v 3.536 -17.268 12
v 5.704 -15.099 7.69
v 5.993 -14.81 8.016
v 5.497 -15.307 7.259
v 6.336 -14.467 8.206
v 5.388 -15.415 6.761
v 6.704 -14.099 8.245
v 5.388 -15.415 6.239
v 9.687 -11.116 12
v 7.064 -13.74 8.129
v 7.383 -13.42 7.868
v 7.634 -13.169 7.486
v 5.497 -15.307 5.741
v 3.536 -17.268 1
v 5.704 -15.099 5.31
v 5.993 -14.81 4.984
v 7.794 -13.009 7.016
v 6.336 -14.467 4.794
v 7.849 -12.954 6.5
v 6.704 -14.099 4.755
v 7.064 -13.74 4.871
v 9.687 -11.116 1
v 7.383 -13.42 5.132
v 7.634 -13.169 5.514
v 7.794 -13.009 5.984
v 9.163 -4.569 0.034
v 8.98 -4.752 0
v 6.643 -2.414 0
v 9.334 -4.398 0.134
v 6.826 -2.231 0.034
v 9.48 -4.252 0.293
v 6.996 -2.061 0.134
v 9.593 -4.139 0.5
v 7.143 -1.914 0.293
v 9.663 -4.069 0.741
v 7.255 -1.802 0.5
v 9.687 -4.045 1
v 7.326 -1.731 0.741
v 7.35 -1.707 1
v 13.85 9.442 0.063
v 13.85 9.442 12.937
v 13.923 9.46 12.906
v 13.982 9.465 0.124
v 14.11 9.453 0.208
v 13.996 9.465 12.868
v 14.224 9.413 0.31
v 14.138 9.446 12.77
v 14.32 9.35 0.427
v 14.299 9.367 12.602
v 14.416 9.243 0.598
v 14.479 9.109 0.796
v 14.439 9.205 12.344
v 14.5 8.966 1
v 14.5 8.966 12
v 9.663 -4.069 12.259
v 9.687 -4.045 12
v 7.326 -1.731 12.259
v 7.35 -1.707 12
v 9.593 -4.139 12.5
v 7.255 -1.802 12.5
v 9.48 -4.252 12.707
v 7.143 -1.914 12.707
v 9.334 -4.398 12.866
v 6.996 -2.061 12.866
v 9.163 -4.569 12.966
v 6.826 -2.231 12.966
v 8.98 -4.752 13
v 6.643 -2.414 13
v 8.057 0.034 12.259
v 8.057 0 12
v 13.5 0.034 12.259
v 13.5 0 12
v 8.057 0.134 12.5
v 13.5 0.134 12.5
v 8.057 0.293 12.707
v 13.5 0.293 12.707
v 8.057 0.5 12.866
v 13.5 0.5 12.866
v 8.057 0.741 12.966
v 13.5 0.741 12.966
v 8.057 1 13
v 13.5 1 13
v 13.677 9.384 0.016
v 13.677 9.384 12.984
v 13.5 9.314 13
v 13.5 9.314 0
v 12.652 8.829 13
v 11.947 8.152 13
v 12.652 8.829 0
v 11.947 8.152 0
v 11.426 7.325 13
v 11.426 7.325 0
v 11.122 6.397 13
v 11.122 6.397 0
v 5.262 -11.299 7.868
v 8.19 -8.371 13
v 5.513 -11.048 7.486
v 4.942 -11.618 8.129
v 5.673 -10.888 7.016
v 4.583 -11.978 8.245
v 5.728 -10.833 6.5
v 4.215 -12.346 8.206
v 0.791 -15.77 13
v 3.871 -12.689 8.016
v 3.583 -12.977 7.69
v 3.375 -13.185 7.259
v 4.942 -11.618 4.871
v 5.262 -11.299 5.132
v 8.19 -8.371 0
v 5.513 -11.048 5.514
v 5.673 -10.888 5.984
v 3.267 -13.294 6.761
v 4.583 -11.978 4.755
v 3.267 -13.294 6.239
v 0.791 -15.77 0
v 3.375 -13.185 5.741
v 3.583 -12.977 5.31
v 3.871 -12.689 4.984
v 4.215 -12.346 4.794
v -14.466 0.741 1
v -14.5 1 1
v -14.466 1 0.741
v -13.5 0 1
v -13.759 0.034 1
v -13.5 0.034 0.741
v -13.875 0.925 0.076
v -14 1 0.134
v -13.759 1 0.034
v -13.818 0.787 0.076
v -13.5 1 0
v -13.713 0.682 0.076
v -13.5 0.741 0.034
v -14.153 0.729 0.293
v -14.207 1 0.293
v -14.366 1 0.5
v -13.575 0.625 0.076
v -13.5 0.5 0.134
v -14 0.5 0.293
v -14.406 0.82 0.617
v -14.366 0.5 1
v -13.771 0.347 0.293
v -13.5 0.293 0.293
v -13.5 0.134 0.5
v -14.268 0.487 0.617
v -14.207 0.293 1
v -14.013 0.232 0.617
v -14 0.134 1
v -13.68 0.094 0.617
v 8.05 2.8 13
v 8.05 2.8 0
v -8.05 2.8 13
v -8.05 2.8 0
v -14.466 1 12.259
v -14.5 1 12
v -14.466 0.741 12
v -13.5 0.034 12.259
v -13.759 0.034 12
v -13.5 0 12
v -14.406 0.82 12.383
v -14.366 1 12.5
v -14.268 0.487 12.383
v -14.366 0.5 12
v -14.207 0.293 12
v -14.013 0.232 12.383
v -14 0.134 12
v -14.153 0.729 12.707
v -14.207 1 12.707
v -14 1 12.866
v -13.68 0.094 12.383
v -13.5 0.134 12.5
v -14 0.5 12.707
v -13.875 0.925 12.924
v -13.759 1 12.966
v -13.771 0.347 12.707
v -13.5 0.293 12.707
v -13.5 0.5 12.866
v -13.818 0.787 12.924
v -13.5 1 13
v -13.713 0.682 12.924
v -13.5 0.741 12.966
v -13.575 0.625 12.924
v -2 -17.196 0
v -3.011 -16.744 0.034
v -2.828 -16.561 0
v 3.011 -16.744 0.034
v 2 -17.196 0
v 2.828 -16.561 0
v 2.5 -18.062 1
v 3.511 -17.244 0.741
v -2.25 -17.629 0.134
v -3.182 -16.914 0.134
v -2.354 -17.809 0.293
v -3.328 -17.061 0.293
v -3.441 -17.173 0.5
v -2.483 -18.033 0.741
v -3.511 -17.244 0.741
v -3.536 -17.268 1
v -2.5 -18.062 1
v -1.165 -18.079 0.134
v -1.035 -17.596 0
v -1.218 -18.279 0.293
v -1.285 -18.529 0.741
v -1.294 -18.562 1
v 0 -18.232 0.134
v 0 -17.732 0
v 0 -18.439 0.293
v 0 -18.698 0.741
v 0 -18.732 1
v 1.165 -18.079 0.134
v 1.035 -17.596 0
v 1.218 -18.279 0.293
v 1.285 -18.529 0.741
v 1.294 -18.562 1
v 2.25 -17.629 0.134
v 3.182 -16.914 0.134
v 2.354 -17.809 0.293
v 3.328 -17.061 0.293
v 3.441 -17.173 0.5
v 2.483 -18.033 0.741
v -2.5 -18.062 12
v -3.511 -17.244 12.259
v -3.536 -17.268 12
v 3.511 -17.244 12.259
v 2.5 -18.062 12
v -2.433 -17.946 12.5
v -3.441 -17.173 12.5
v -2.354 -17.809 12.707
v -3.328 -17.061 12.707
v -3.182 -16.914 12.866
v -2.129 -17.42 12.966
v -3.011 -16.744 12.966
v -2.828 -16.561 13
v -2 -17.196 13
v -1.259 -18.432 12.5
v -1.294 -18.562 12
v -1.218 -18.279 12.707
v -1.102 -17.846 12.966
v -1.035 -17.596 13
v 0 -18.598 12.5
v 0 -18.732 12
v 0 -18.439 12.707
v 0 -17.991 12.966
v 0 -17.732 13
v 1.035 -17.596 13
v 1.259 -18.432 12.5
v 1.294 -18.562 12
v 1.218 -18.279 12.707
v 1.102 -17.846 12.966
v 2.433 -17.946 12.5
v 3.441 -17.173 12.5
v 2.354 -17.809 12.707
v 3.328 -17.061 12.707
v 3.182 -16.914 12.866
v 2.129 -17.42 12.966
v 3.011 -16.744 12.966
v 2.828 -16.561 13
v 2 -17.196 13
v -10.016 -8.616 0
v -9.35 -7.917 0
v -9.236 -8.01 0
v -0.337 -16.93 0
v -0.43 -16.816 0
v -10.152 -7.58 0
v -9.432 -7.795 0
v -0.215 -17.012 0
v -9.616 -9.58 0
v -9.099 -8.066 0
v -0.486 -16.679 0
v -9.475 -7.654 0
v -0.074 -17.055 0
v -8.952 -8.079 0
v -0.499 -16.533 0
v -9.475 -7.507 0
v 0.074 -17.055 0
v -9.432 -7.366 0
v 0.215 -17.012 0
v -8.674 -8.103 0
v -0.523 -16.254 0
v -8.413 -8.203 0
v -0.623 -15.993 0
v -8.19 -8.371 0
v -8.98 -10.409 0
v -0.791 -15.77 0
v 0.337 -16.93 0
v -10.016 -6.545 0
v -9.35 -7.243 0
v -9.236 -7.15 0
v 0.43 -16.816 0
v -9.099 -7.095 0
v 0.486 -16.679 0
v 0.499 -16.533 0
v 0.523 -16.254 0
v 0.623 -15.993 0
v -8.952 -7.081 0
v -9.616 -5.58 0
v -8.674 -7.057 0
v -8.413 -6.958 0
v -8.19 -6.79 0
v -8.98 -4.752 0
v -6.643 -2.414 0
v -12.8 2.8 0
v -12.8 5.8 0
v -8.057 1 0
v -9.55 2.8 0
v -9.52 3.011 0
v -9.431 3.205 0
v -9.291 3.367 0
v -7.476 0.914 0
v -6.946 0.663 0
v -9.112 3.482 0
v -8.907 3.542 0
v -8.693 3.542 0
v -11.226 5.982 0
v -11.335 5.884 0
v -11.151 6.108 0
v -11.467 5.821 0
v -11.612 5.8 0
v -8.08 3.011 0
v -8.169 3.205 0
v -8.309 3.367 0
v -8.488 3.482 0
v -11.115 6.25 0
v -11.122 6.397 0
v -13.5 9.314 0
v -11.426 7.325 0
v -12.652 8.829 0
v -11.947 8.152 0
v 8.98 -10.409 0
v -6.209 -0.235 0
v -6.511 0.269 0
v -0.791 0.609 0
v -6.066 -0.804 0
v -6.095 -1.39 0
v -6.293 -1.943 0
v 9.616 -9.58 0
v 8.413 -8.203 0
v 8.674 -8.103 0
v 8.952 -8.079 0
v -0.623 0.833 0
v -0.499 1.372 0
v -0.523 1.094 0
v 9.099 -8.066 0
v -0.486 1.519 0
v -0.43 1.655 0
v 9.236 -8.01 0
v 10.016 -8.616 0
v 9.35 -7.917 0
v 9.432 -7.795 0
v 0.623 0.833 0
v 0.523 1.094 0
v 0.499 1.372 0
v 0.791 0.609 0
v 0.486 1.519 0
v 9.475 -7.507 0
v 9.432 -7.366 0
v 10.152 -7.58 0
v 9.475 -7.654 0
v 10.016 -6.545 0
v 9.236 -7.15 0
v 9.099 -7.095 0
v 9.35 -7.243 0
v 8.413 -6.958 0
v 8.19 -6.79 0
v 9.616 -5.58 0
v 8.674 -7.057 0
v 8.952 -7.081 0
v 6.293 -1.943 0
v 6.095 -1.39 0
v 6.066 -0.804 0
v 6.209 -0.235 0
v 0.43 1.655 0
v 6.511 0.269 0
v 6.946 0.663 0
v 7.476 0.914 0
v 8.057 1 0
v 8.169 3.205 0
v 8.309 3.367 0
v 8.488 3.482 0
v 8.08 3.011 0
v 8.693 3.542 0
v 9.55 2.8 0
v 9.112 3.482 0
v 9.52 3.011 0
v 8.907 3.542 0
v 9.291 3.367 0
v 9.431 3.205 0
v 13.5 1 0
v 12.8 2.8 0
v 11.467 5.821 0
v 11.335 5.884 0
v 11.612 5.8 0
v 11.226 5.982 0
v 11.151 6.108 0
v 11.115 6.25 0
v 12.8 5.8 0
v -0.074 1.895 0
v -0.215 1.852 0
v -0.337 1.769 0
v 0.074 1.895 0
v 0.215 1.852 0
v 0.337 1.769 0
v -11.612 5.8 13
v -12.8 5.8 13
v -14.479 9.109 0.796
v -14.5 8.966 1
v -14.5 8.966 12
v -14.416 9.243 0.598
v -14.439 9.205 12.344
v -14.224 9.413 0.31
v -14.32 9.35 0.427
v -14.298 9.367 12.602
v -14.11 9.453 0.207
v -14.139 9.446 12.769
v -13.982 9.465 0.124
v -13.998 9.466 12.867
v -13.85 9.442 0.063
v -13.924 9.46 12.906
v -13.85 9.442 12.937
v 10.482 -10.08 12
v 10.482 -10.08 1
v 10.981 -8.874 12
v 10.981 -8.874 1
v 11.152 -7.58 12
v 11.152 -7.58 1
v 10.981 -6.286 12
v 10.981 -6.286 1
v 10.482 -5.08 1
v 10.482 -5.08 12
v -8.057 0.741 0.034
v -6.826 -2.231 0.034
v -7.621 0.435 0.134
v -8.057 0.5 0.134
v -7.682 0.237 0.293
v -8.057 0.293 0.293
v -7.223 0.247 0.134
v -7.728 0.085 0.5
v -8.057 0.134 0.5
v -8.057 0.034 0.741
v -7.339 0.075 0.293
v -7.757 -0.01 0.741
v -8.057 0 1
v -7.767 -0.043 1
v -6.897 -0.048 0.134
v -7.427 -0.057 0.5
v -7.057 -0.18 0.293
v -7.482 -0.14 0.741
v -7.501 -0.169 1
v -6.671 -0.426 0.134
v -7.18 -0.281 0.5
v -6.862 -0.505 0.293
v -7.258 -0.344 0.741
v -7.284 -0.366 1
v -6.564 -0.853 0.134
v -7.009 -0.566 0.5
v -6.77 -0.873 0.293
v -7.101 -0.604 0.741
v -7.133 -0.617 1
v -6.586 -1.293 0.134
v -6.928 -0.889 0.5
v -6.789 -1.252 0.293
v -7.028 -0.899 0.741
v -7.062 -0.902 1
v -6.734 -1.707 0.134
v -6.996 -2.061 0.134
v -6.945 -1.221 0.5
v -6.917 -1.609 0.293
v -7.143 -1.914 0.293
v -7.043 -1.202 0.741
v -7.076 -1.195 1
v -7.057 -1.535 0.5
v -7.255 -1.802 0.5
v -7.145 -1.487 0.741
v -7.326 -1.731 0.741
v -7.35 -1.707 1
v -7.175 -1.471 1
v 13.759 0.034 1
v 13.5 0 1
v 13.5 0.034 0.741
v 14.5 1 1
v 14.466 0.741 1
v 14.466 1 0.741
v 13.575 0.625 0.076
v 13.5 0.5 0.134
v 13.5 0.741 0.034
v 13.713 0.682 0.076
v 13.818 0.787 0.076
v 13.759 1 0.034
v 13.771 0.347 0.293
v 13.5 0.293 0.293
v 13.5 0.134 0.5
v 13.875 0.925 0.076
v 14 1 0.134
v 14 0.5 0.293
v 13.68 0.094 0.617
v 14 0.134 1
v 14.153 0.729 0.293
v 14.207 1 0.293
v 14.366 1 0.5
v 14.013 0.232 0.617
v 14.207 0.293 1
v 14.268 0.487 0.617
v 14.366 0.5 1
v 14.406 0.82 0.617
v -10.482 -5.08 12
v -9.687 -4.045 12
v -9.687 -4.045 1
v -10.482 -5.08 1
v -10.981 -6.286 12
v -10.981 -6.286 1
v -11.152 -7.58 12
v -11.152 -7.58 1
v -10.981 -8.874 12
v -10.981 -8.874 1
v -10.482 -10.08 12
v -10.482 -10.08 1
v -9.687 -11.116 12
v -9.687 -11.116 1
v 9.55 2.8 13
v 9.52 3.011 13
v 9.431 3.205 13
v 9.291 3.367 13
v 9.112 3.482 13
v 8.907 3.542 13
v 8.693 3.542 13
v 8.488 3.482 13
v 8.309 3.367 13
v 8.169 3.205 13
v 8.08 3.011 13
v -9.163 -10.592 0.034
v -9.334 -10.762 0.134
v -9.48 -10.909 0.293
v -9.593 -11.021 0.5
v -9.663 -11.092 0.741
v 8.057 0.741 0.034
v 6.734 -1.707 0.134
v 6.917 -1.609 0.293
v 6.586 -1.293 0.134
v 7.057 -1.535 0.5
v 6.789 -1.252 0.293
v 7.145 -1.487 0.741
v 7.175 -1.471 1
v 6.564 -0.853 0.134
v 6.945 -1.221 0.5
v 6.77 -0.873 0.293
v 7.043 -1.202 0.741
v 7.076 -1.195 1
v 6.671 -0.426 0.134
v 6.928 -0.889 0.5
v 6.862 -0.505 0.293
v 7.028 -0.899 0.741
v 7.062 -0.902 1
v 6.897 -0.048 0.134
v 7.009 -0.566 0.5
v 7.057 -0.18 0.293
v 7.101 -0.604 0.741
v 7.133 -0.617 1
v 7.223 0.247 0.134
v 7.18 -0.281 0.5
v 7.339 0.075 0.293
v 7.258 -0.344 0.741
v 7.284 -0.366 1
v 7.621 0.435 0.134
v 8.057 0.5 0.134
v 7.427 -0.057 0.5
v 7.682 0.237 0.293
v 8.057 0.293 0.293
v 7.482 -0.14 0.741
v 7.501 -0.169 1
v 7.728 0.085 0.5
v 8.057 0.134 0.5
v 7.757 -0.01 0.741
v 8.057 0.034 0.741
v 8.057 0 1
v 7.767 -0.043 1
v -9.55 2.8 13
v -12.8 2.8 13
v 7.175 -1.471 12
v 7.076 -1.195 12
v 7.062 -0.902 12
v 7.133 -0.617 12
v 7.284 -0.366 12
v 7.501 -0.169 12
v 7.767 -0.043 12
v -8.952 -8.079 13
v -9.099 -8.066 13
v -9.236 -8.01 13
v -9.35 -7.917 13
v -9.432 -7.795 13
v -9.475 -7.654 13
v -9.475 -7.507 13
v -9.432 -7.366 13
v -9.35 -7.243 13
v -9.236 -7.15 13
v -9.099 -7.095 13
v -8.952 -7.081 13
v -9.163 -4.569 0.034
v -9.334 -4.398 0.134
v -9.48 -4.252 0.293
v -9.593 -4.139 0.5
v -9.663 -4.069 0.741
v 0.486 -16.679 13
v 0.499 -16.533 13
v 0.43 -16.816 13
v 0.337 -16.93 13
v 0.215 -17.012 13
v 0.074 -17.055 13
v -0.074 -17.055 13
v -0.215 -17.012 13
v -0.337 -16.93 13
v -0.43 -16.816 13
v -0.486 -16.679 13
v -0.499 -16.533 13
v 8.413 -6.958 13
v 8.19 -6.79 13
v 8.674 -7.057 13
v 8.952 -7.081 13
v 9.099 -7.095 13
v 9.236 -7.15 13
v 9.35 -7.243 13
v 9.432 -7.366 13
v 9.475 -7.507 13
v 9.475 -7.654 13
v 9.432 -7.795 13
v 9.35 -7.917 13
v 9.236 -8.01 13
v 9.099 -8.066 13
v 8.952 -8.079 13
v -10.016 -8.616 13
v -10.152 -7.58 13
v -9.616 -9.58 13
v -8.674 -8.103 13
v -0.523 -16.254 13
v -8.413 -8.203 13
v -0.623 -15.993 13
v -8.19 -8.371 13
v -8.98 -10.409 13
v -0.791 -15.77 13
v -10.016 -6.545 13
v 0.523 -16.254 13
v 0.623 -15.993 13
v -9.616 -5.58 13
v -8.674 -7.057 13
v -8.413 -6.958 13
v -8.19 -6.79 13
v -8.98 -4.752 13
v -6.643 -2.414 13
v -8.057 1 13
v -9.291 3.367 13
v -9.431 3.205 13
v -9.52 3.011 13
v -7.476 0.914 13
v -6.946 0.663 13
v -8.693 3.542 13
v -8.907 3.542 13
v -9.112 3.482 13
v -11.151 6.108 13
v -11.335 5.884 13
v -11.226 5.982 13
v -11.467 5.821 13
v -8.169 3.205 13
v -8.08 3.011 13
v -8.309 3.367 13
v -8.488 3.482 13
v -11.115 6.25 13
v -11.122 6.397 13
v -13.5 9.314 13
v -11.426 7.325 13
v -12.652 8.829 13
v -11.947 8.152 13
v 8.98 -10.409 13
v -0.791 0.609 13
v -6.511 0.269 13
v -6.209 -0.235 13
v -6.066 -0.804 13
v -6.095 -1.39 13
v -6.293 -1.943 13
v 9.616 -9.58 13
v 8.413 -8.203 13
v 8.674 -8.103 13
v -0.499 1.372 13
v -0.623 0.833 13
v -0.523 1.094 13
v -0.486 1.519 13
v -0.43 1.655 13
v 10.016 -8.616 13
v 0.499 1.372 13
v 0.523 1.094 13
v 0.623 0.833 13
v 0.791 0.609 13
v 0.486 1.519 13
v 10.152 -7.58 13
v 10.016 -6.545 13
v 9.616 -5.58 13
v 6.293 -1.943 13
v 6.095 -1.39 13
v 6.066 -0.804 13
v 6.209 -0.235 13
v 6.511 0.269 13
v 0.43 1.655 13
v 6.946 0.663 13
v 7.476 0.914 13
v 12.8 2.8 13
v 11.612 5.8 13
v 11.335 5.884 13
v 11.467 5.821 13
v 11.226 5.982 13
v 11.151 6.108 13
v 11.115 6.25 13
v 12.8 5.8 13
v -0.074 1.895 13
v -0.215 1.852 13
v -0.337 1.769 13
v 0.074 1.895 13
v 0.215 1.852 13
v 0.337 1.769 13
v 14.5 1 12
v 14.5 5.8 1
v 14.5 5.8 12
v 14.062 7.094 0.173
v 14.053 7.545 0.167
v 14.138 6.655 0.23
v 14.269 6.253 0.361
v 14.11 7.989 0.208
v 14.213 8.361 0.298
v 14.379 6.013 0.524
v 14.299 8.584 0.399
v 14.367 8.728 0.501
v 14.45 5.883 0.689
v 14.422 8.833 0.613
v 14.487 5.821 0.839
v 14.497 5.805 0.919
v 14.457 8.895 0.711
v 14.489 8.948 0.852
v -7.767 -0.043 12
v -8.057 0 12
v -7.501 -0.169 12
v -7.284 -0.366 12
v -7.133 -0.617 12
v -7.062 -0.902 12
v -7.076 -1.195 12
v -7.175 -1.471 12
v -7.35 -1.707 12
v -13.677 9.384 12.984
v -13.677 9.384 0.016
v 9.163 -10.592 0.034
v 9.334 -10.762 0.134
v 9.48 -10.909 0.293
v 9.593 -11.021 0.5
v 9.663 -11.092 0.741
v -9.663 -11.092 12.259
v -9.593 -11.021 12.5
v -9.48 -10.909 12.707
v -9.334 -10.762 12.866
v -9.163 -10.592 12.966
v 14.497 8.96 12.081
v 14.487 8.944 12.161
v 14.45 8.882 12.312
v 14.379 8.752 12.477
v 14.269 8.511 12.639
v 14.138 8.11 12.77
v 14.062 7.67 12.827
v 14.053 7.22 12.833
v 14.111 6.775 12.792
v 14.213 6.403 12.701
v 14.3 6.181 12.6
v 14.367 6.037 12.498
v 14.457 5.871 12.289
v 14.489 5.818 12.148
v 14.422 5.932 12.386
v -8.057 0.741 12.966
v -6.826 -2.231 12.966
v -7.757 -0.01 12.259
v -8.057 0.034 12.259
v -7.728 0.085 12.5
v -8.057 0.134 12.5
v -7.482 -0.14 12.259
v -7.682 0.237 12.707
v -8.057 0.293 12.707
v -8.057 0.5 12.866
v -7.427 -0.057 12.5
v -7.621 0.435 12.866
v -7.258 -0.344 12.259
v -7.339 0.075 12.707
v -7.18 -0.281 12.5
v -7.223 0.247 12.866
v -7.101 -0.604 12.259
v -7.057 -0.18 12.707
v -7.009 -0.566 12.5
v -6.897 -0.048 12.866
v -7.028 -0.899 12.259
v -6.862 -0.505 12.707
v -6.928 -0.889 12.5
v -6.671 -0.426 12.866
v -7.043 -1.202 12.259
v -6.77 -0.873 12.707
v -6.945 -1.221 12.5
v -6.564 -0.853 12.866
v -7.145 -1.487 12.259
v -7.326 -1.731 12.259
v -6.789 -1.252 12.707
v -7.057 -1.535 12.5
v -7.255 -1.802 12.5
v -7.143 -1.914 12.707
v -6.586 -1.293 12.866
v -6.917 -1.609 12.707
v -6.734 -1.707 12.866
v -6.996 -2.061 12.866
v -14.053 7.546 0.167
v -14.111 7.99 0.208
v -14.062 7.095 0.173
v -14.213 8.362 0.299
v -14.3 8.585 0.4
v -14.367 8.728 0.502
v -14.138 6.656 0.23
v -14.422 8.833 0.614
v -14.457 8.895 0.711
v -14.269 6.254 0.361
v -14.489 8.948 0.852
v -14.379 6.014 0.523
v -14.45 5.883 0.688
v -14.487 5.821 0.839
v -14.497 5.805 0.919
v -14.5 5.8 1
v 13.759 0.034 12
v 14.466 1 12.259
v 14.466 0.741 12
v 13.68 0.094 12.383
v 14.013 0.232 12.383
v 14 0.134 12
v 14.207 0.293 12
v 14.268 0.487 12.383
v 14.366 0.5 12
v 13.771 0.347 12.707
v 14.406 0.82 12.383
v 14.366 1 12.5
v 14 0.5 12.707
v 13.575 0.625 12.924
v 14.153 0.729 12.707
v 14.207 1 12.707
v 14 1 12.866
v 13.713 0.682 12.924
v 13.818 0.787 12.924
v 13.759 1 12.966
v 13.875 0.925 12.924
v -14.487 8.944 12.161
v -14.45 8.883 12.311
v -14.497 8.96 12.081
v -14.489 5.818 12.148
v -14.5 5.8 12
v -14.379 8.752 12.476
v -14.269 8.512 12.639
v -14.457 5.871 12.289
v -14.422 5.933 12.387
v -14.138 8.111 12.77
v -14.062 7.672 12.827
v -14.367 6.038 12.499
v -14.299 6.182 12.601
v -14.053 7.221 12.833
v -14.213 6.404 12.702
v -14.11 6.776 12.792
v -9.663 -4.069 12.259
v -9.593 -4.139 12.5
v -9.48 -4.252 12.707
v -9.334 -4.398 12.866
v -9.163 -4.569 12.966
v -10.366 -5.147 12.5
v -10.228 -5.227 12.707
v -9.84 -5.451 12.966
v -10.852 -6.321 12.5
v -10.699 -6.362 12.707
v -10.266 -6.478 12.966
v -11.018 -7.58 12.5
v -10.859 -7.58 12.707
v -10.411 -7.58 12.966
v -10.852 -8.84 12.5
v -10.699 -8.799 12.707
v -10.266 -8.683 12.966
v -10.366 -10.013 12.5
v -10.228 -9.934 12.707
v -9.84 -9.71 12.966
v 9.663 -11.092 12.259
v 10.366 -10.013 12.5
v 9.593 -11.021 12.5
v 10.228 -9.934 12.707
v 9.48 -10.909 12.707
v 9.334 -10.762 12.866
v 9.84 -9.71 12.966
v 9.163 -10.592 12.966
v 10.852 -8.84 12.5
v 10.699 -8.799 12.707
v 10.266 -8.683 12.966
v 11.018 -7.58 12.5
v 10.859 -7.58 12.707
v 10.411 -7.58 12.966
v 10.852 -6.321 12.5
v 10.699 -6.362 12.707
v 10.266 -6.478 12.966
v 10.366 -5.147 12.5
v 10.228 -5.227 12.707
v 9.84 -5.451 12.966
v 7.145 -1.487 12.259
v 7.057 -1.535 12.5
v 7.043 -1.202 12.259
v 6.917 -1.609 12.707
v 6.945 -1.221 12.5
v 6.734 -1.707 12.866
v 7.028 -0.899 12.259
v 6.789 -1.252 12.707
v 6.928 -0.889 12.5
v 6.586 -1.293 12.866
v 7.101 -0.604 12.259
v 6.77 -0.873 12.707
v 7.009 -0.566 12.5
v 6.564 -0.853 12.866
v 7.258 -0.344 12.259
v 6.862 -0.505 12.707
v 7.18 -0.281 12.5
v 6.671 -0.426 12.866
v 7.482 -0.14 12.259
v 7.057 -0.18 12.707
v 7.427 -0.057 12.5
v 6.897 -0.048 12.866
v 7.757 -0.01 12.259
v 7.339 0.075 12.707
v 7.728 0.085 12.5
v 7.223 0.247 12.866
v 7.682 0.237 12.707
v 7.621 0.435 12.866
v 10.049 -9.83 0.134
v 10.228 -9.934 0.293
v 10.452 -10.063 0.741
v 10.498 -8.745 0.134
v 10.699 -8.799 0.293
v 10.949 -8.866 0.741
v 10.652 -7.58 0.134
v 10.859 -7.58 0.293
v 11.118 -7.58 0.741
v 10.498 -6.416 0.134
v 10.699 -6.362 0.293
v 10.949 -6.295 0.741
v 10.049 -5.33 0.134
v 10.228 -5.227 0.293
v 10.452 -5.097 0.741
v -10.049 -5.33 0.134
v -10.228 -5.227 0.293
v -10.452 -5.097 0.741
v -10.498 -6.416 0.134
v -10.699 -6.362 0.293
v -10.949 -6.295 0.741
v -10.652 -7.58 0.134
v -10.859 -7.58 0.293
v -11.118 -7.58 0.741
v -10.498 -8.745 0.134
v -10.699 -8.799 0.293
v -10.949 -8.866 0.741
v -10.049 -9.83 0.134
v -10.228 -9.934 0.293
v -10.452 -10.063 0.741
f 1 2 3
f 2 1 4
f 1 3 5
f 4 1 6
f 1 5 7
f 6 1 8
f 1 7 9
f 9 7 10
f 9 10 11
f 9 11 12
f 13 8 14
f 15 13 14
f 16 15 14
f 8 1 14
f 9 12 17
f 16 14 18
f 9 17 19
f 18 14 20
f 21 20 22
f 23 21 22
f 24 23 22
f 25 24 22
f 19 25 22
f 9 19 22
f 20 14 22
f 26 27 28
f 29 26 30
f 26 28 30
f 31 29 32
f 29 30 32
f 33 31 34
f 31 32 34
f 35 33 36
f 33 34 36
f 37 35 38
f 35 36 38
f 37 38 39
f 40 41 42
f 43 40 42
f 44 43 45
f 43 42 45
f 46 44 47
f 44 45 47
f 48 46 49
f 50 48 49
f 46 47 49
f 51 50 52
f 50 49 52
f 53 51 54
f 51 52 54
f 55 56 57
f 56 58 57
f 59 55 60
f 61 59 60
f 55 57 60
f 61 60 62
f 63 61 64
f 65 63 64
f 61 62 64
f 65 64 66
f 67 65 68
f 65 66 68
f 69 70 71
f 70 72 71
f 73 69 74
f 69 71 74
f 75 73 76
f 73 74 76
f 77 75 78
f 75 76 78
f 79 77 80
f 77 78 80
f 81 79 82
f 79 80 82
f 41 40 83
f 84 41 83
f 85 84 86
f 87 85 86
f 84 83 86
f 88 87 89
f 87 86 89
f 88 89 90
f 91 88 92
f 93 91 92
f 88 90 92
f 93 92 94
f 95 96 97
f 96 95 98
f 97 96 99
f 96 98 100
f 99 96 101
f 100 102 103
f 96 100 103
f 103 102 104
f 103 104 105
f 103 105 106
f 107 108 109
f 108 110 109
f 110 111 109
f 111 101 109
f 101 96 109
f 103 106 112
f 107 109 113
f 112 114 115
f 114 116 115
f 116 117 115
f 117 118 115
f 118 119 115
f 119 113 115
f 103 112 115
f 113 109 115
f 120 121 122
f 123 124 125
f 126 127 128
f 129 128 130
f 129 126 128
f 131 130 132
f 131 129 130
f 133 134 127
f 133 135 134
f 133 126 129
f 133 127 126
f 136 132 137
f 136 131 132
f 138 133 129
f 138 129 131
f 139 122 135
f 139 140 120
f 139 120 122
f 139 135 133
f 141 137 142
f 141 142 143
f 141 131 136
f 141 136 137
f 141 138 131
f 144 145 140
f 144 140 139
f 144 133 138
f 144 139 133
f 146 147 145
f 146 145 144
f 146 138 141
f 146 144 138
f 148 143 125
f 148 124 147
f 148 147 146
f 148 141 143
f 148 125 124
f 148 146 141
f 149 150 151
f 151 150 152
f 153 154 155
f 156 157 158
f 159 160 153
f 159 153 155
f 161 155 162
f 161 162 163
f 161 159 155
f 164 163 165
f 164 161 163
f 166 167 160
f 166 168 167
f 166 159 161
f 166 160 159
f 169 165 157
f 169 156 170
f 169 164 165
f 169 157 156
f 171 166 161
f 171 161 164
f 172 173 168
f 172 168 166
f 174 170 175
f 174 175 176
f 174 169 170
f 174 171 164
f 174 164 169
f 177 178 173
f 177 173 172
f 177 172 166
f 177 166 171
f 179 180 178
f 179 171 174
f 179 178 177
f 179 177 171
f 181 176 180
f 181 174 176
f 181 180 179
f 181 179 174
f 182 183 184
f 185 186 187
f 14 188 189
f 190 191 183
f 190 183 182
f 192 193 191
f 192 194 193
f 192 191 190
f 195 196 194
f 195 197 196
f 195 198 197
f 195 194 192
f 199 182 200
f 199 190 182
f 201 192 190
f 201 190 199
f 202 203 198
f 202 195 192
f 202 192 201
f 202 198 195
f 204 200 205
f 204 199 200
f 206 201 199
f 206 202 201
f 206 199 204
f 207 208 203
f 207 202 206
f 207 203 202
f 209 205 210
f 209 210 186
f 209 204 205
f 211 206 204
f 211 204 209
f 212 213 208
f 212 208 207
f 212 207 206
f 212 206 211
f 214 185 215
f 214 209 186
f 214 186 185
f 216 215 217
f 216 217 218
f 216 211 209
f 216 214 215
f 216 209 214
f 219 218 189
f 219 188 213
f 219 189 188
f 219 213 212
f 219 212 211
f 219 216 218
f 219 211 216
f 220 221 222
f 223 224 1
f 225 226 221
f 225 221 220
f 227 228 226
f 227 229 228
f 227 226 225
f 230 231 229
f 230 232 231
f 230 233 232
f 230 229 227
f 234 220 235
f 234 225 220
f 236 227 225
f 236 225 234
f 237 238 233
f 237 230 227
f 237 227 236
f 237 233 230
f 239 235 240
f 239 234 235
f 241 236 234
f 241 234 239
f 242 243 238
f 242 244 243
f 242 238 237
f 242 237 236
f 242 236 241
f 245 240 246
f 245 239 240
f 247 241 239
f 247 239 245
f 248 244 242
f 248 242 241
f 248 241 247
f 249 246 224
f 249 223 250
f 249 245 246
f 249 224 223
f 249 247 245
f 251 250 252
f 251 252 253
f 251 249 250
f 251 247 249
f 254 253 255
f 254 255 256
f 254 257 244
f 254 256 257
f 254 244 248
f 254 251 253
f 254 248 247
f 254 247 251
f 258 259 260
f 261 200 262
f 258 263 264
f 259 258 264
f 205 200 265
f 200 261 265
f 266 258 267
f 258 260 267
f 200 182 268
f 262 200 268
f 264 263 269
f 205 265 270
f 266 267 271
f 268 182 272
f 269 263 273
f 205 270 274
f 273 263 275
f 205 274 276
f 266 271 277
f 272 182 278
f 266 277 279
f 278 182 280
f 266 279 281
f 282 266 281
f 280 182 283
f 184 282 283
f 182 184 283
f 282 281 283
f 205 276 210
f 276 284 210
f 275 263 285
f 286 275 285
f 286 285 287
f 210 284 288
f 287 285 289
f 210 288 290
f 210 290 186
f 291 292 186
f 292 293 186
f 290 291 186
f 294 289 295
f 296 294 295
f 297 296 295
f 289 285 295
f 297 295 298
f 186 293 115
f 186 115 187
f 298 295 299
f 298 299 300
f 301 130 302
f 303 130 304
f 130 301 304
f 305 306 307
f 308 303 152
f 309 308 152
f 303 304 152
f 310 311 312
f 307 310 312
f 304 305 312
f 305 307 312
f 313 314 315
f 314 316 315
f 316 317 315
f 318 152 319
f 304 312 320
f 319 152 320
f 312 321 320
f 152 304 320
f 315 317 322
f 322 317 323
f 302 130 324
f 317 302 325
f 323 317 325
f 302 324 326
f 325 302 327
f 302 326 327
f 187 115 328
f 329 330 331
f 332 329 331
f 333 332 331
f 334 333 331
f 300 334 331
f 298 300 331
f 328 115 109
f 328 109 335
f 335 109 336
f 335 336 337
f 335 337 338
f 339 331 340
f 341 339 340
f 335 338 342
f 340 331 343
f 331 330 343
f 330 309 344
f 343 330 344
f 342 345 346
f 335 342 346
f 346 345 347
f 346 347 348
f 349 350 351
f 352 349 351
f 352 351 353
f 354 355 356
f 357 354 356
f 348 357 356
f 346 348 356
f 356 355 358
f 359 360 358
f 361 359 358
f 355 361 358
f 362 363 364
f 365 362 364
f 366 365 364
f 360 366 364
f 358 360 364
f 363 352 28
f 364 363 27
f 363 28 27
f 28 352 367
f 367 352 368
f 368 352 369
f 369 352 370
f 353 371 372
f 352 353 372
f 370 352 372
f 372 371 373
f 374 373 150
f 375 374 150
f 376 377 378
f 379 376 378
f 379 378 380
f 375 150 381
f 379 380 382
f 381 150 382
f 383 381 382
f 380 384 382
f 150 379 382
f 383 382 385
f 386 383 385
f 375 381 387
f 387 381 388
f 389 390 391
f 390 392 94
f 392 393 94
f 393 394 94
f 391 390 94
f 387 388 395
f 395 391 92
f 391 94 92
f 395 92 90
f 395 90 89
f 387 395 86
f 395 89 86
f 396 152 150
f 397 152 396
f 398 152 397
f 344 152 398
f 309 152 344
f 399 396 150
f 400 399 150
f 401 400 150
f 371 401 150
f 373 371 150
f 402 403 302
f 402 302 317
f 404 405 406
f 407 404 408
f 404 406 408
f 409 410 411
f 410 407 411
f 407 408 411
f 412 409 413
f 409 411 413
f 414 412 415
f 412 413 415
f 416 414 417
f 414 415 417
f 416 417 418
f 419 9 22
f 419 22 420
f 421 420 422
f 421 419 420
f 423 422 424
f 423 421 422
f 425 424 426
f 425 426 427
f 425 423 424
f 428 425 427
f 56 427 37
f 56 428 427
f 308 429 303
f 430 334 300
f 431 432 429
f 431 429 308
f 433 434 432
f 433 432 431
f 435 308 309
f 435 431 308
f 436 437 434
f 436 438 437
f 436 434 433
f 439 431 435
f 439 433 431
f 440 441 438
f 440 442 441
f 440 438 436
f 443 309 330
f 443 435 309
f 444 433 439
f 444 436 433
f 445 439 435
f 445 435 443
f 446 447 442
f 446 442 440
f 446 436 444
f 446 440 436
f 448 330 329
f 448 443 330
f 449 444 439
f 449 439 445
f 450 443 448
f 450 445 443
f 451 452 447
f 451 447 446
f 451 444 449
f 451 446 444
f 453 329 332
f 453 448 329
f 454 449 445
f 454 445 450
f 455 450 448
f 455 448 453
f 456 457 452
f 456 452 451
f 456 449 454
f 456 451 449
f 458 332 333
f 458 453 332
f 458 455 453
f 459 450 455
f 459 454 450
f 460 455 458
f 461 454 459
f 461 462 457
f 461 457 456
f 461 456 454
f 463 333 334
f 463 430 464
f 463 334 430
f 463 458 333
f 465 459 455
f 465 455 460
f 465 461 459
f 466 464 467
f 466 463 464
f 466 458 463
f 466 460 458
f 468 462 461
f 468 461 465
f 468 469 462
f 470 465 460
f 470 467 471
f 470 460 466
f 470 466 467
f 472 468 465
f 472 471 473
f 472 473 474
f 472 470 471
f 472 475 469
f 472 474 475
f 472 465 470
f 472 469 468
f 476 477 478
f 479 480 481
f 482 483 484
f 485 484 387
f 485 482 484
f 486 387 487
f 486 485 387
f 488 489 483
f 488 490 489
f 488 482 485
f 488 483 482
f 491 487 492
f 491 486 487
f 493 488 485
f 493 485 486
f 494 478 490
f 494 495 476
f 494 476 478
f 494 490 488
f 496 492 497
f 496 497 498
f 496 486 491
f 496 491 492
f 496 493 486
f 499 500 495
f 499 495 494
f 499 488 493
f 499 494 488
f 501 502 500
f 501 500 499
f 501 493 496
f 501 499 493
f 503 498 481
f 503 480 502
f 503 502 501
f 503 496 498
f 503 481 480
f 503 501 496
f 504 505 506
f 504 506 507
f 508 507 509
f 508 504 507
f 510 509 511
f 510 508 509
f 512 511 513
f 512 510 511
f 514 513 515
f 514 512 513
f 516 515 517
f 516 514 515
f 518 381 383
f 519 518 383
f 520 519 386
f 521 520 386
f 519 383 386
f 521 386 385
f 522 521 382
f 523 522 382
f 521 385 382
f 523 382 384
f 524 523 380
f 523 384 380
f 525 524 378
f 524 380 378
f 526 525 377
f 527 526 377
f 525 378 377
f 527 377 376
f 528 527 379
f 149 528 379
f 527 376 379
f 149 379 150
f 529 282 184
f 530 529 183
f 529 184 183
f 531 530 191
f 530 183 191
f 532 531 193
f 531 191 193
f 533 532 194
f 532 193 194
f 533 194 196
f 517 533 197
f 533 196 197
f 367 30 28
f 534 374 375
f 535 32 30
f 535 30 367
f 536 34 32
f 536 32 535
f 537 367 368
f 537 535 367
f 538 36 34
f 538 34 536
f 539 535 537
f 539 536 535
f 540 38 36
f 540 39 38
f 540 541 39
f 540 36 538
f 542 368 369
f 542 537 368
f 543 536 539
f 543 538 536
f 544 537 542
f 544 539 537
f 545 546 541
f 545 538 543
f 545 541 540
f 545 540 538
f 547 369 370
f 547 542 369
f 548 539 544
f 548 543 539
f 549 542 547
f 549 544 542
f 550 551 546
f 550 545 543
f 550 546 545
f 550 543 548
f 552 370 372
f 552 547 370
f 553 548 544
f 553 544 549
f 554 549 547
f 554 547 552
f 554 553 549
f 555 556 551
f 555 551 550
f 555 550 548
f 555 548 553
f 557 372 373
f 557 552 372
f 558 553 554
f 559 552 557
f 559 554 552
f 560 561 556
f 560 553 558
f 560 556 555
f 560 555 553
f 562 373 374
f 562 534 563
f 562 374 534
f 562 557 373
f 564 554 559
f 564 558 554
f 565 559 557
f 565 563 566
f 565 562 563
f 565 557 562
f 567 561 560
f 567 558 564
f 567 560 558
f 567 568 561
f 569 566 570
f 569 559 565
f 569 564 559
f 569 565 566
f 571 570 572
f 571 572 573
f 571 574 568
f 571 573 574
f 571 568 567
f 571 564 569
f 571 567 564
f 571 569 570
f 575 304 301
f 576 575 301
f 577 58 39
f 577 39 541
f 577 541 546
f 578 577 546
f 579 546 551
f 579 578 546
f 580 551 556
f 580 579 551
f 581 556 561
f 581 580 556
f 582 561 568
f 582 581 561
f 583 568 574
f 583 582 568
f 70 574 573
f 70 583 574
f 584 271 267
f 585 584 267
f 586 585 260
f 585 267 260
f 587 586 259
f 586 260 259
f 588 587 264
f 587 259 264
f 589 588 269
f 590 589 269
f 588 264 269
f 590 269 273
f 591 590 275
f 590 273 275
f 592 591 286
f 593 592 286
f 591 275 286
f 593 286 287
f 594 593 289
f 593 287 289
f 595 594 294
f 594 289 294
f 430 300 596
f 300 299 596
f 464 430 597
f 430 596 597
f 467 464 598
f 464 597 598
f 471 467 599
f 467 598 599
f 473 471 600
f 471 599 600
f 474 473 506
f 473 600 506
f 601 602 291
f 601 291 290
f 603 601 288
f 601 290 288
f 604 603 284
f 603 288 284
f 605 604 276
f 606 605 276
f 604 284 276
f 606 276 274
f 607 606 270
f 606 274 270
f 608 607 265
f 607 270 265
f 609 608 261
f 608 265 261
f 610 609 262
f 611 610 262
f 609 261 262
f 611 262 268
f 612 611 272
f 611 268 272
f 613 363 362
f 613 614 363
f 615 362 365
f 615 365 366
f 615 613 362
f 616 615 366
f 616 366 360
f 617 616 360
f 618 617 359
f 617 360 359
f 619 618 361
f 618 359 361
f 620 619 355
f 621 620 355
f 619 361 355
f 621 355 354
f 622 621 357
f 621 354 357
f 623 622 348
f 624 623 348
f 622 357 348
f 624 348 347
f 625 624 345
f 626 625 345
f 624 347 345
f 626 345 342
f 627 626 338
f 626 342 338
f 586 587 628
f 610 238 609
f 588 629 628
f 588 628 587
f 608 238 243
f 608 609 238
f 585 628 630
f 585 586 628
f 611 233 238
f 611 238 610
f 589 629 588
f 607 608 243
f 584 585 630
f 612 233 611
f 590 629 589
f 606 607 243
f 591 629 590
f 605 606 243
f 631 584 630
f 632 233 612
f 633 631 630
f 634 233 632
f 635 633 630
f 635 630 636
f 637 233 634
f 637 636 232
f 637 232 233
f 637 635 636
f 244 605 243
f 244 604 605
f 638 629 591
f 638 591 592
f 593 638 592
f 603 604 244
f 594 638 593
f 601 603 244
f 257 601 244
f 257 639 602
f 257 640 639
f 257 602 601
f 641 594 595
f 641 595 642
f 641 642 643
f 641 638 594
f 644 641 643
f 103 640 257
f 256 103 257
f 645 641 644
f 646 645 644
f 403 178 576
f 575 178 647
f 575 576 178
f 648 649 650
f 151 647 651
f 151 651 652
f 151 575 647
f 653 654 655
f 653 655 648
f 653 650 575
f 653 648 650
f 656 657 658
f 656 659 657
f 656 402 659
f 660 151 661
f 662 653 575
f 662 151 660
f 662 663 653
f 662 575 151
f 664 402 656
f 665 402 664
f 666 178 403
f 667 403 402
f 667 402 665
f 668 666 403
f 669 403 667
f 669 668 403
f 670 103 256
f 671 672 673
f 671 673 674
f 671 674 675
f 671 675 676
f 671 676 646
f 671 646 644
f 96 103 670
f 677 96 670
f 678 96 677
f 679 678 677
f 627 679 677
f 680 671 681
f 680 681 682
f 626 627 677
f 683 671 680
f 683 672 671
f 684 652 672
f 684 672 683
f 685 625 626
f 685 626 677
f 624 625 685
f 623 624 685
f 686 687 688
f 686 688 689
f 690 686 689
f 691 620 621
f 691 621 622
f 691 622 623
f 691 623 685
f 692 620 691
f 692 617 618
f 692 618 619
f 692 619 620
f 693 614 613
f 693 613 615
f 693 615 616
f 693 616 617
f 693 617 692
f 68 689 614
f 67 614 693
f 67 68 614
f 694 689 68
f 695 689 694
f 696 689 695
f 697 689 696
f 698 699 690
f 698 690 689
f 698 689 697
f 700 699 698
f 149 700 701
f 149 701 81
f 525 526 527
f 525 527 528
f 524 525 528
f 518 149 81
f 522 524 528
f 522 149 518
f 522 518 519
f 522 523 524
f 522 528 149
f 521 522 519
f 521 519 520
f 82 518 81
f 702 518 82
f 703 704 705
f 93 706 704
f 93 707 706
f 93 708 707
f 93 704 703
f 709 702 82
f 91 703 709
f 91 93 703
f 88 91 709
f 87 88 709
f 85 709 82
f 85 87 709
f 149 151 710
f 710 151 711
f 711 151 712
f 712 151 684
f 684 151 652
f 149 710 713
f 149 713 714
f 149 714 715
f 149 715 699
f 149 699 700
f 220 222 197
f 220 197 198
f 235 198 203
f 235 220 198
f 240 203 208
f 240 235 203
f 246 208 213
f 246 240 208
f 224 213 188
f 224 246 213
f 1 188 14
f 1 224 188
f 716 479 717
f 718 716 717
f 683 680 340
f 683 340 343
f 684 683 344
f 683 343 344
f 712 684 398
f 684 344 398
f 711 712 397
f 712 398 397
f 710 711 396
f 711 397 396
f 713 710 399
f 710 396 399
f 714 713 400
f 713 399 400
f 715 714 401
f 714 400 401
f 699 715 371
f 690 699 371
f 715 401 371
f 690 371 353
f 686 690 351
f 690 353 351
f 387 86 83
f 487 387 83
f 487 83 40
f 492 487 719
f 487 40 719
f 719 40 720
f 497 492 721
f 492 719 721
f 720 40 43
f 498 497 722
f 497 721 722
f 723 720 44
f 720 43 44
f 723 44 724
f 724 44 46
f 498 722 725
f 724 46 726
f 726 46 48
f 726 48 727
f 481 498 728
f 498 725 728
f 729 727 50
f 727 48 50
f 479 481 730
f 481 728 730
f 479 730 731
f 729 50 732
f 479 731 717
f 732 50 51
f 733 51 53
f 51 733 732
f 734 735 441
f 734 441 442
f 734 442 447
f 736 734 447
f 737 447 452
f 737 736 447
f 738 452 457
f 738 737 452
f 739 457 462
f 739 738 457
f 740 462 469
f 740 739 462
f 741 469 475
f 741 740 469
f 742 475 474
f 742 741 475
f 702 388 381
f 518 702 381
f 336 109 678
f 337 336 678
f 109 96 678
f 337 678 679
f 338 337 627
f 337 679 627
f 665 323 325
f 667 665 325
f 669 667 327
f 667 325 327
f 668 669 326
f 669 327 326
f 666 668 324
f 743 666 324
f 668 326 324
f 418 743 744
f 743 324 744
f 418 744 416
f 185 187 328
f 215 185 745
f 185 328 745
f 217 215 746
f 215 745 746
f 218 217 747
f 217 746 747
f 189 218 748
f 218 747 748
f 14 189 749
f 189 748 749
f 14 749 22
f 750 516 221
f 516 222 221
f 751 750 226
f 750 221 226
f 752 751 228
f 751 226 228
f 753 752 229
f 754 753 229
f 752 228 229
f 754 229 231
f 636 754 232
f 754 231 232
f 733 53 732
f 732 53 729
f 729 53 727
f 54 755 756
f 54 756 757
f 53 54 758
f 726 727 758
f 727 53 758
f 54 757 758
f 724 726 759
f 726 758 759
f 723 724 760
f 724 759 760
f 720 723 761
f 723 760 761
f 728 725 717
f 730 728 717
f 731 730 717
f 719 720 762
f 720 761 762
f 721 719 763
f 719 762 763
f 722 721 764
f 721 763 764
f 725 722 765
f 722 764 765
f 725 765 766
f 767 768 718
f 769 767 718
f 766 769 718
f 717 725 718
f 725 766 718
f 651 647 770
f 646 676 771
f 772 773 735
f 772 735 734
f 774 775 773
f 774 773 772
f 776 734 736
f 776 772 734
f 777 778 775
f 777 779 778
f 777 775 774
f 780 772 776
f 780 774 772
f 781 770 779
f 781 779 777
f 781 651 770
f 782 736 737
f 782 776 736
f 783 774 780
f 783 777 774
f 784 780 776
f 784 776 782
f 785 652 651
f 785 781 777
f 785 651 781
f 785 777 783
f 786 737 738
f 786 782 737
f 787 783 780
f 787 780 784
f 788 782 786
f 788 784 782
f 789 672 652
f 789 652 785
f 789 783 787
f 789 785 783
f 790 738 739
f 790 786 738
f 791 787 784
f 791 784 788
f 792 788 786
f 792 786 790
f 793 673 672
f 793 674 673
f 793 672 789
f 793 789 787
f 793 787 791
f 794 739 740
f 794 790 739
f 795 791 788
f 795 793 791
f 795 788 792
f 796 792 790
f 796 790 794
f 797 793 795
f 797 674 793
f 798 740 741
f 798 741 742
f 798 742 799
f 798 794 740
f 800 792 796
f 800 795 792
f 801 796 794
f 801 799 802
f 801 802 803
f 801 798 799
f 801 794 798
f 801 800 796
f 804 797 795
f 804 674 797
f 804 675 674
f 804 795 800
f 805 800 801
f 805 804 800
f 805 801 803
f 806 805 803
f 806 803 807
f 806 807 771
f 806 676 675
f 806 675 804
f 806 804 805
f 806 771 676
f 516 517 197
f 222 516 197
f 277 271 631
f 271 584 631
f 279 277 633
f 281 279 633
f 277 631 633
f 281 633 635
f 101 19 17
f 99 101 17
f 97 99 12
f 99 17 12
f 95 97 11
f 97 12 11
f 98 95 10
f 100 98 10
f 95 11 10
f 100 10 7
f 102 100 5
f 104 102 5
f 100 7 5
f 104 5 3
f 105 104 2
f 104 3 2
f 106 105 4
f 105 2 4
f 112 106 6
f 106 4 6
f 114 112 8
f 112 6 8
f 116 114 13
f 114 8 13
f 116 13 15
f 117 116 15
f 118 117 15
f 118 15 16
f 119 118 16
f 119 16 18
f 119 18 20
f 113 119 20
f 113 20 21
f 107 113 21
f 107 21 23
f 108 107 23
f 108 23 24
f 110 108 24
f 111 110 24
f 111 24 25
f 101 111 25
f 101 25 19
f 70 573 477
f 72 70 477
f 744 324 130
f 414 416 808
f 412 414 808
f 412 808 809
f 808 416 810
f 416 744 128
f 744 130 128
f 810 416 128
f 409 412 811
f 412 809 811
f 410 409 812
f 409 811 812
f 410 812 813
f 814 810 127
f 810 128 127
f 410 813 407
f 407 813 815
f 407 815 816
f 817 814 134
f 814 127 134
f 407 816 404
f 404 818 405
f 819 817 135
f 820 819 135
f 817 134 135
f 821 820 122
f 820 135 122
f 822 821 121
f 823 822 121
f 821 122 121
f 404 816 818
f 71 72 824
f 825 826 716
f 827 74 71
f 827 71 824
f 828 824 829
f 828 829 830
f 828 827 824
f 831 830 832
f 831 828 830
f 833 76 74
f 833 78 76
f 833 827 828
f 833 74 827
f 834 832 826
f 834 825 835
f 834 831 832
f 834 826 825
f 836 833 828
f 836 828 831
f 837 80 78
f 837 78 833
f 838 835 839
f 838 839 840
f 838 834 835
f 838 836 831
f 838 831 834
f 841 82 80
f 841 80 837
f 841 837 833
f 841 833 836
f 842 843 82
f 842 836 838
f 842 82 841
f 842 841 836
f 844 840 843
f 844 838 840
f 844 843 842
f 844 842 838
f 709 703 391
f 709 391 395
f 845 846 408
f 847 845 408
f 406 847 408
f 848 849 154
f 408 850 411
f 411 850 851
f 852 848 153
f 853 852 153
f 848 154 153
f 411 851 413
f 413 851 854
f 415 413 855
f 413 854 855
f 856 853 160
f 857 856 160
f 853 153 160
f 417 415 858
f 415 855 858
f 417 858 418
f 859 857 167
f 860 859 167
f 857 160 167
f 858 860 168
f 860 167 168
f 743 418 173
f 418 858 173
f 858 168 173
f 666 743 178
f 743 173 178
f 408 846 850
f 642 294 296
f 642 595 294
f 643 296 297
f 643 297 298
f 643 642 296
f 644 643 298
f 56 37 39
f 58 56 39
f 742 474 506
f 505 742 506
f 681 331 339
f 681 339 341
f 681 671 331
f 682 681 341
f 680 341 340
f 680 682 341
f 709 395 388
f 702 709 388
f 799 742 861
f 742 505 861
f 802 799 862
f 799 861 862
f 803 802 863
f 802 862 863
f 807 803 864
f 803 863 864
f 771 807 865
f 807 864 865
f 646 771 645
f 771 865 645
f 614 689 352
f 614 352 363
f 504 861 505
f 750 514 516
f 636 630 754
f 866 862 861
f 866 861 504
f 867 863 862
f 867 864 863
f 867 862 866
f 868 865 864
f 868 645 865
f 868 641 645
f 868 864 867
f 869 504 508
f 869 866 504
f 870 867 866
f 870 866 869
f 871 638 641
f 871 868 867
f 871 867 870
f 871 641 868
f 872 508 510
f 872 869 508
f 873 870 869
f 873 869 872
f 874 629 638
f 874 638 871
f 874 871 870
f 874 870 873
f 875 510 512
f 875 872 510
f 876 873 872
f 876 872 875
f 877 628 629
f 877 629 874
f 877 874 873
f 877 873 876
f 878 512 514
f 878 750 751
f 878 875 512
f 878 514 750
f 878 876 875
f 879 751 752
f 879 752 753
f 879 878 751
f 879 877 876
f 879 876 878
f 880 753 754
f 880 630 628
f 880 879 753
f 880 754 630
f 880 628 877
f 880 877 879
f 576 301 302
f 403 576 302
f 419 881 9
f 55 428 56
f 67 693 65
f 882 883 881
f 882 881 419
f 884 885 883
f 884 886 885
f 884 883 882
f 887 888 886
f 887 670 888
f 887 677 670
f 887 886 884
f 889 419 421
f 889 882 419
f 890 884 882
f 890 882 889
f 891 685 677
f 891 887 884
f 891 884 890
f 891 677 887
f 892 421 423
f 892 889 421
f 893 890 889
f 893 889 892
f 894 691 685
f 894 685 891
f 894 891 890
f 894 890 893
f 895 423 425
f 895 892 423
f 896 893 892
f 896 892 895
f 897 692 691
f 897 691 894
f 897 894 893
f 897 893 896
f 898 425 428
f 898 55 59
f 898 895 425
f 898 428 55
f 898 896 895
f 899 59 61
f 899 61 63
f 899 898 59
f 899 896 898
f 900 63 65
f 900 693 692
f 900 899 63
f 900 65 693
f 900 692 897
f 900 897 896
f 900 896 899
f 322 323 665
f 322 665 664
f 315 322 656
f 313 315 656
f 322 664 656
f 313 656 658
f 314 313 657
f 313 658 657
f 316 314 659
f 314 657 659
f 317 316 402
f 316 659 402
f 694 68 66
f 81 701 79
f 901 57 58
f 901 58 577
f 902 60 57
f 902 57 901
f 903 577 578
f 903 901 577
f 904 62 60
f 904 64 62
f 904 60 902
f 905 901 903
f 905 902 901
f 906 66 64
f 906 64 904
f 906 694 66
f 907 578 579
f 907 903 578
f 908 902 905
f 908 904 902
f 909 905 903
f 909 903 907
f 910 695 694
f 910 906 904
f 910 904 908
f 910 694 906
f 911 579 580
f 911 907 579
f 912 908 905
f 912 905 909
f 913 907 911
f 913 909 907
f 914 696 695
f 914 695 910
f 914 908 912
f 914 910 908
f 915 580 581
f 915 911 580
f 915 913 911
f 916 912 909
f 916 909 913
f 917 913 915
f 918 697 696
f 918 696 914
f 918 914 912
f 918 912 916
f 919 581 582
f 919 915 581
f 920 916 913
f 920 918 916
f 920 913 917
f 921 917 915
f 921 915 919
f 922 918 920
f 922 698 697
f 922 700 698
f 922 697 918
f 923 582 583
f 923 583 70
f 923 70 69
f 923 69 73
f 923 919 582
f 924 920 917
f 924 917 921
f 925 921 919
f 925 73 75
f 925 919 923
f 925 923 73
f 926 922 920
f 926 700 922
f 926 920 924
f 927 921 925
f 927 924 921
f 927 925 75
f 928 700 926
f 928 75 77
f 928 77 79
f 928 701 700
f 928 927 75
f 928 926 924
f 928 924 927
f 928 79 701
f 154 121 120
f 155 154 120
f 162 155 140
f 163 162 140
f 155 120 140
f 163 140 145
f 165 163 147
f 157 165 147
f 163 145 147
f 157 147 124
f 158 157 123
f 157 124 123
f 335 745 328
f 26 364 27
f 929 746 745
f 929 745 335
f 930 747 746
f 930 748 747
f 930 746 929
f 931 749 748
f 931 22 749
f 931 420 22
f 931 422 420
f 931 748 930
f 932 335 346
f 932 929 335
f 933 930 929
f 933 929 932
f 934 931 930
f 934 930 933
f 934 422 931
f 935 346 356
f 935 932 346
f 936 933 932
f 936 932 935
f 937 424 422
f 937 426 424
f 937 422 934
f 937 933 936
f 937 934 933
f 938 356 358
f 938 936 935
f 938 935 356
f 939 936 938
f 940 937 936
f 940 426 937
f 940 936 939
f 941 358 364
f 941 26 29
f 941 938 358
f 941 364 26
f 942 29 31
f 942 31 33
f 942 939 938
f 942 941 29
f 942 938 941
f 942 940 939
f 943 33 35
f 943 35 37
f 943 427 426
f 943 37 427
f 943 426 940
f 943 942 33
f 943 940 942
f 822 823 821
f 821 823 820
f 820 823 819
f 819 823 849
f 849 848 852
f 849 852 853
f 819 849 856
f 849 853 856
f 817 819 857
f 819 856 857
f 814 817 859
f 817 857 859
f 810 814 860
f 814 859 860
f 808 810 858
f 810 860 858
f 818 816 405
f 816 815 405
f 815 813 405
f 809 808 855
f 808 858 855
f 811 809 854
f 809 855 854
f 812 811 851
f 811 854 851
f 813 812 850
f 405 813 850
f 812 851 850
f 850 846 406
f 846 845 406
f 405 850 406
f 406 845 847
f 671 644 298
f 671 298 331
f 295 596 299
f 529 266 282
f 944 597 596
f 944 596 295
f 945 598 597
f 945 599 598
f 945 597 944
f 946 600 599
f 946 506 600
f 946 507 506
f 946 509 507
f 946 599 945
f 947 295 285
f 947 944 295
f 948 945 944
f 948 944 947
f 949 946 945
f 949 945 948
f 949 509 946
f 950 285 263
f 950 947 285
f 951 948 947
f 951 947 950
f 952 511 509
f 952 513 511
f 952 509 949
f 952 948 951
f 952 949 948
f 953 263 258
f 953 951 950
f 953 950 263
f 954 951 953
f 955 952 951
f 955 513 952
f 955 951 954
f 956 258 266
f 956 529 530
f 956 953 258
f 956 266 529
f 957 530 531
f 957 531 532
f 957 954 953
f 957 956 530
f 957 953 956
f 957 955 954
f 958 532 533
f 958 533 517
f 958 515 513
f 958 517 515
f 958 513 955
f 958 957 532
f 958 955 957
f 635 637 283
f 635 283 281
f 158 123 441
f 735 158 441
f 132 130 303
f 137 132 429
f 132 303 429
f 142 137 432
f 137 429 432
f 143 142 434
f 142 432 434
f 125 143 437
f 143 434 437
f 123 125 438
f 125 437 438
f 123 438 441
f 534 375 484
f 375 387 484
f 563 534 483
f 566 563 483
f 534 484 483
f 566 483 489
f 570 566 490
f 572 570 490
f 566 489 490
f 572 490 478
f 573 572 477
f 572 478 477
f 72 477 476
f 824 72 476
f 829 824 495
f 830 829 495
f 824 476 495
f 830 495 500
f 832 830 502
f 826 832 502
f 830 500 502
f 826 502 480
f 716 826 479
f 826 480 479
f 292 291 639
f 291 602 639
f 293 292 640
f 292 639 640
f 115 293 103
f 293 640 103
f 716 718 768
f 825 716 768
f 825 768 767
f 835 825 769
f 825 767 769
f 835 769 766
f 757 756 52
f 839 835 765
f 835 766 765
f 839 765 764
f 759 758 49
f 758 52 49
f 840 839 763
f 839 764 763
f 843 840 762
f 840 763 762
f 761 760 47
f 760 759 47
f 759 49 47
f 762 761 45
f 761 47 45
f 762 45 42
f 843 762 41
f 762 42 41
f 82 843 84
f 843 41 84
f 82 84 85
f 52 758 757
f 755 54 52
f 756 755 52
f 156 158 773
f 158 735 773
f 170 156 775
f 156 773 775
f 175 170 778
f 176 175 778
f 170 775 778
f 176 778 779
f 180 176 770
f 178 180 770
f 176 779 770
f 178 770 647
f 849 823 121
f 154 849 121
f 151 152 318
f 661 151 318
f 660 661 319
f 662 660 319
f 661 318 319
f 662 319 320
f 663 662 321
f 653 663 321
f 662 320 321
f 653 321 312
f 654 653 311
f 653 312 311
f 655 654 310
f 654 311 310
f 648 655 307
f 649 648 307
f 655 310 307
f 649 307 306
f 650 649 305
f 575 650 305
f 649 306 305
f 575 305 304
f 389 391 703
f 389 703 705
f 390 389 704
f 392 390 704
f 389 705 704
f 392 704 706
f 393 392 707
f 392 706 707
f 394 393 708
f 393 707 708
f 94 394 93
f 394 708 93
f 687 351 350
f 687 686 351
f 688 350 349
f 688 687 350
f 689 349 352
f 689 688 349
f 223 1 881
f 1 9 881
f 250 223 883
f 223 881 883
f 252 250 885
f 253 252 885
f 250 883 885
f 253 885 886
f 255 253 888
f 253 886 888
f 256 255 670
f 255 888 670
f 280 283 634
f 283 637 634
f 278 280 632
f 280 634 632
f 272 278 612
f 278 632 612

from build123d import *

# Parameters (mm, degrees)
F1_DEPTH  = 13
F4_DEPTH  = 13.001
F5_R      = 0.49999
F6_R      = 1
F7_R      = 5
F8_R      = 1
F9_R      = 0.5
F10_R     = 1
F11_R     = 1.75
F12_DEPTH = 15.6999998824


# Not quite as in the source:
# - a fillet or chamfer is up to 0.001 mm smaller than in the source, because OpenCascade refuses the exact size


with BuildPart() as f1:
    # F0 (on Top) → F1 (new body)
    with BuildSketch(Plane.XY):
        with BuildLine():
            ThreePointArc((-14.5, 1), (-14.2071067812, 0.2928932188), (-13.5, 0))
            Line((-13.5, 0), (-5.6426405208, 0))
            Line((-5.6426405208, 0), (-13.2228966419, -7.5802561211))
            Line((-13.2228966419, -7.5802561211), (0, -20.803152763))
            Line((0, -20.803152763), (13.2228966419, -7.5802561211))
            Line((13.2228966419, -7.5802561211), (5.6426405208, 0))
            Line((5.6426405208, 0), (13.5, 0))
            ThreePointArc((13.5, 0), (14.2071067812, 0.2928932188), (14.5, 1))
            Line((14.5, 1), (14.5, 9.5887489808))
            ThreePointArc((14.5, 9.5887489808), (12.0898455808, 8.3182698074), (11.05, 5.8))
            Line((11.05, 5.8), (12.8, 5.8))
            Line((12.8, 5.8), (12.8, 2.8))
            Line((12.8, 2.8), (9.55, 2.8))
            ThreePointArc((9.55, 2.8), (8.8, 3.55), (8.05, 2.8))
            Line((8.05, 2.8), (-8.05, 2.8))
            ThreePointArc((-8.05, 2.8), (-8.8, 3.55), (-9.55, 2.8))
            Line((-9.55, 2.8), (-12.8, 2.8))
            Line((-12.8, 2.8), (-12.8, 5.8))
            Line((-12.8, 5.8), (-11.05, 5.8))
            ThreePointArc((-11.05, 5.8), (-12.0898455808, 8.3182698074), (-14.5, 9.5887489808))
            Line((-14.5, 9.5887489808), (-14.5, 1))
        make_face()
        with BuildLine():
            Line((-8.6267027305, -7.2267027305), (-0.3535533906, 1.0464466094))
            ThreePointArc((-0.3535533906, 1.0464466094), (0, 1.9), (0.3535533906, 1.0464466094))
            Line((0.3535533906, 1.0464466094), (8.6267027305, -7.2267027305))
            ThreePointArc((8.6267027305, -7.2267027305), (9.4802561211, -7.5802561211), (8.6267027305, -7.9338095117))
            Line((8.6267027305, -7.9338095117), (0.3535533906, -16.2069588515))
            ThreePointArc((0.3535533906, -16.2069588515), (0, -17.0605122421), (-0.3535533906, -16.2069588515))
            Line((-0.3535533906, -16.2069588515), (-8.6267027305, -7.9338095117))
            ThreePointArc((-8.6267027305, -7.9338095117), (-9.4802561211, -7.5802561211), (-8.6267027305, -7.2267027305))
        make_face(mode=Mode.SUBTRACT)
    extrude(amount=F1_DEPTH)

    # F3 (on face) → F4 (cut, through all)
    with BuildSketch(Plane.XY.offset(13)):
        with BuildLine():
            ThreePointArc((-14.5, 5.8), (-14.0485078359, 7.3827532374), (-14.5, 8.9655064748))
            Line((-14.5, 8.9655064748), (-14.5, 5.8))
        make_face()
        with BuildLine():
            Line((14.5, 5.8), (14.5, 8.9655064748))
            ThreePointArc((14.5, 8.9655064748), (14.0485078359, 7.3827532374), (14.5, 5.8))
        make_face()
    extrude(amount=-F4_DEPTH, mode=Mode.SUBTRACT)

    # F5 (radius 0.5 in the source; OpenCascade refuses exactly that, so slightly less here)
    f5_edges = [f1.edges().sort_by_distance(p)[0] for p in [
        (-14.5, 9.588749, 6.5),
        (14.5, 9.588749, 6.5),
    ]]
    fillet(f5_edges, radius=F5_R)

    # F6
    f6_edges = [f1.edges().sort_by_distance(p)[0] for p in [
        (-5.642641, 0, 6.5),
        (5.642641, 0, 6.5),
    ]]
    fillet(f6_edges, radius=F6_R)

    # F7
    f7_edges = [f1.edges().sort_by_distance(p)[0] for p in [
        (-13.222897, -7.580256, 6.5),
        (0, -20.803153, 6.5),
        (13.222897, -7.580256, 6.5),
    ]]
    fillet(f7_edges, radius=F7_R)

    # F8
    f8_edges = [f1.edges().sort_by_distance(p)[0] for p in [
        (-6.611448, -14.191704, 13),
        (-6.611448, -14.191704, 0),
    ]]
    fillet(f8_edges, radius=F8_R)

    # F9
    f9_edges = [f1.edges().sort_by_distance(p)[0] for p in [
        (-11.05, 5.8, 6.5),
        (11.05, 5.8, 6.5),
    ]]
    fillet(f9_edges, radius=F9_R)

    # F10
    f10_edges = [f1.edges().sort_by_distance(p)[0] for p in [
        (-0.353553, 1.046447, 6.5),
        (0.353553, 1.046447, 6.5),
        (-8.626703, -7.226703, 6.5),
        (-8.626703, -7.93381, 6.5),
        (-0.353553, -16.206959, 6.5),
        (0.353553, -16.206959, 6.5),
        (8.626703, -7.226703, 6.5),
        (8.626703, -7.93381, 6.5),
    ]]
    fillet(f10_edges, radius=F10_R)

    # F11 (on face) → F12 (cut, through all)
    with BuildSketch(Plane(origin=(10.4015763815, -10.4015763815, 0), x_dir=(0.7071067812, 0.7071067812, 0), z_dir=(0.7071067812, -0.7071067812, 0))):
        with Locations((-5.3600505063, 6.5)):
            Circle(F11_R)
    extrude(amount=-F12_DEPTH, mode=Mode.SUBTRACT)


solid = f1.part
